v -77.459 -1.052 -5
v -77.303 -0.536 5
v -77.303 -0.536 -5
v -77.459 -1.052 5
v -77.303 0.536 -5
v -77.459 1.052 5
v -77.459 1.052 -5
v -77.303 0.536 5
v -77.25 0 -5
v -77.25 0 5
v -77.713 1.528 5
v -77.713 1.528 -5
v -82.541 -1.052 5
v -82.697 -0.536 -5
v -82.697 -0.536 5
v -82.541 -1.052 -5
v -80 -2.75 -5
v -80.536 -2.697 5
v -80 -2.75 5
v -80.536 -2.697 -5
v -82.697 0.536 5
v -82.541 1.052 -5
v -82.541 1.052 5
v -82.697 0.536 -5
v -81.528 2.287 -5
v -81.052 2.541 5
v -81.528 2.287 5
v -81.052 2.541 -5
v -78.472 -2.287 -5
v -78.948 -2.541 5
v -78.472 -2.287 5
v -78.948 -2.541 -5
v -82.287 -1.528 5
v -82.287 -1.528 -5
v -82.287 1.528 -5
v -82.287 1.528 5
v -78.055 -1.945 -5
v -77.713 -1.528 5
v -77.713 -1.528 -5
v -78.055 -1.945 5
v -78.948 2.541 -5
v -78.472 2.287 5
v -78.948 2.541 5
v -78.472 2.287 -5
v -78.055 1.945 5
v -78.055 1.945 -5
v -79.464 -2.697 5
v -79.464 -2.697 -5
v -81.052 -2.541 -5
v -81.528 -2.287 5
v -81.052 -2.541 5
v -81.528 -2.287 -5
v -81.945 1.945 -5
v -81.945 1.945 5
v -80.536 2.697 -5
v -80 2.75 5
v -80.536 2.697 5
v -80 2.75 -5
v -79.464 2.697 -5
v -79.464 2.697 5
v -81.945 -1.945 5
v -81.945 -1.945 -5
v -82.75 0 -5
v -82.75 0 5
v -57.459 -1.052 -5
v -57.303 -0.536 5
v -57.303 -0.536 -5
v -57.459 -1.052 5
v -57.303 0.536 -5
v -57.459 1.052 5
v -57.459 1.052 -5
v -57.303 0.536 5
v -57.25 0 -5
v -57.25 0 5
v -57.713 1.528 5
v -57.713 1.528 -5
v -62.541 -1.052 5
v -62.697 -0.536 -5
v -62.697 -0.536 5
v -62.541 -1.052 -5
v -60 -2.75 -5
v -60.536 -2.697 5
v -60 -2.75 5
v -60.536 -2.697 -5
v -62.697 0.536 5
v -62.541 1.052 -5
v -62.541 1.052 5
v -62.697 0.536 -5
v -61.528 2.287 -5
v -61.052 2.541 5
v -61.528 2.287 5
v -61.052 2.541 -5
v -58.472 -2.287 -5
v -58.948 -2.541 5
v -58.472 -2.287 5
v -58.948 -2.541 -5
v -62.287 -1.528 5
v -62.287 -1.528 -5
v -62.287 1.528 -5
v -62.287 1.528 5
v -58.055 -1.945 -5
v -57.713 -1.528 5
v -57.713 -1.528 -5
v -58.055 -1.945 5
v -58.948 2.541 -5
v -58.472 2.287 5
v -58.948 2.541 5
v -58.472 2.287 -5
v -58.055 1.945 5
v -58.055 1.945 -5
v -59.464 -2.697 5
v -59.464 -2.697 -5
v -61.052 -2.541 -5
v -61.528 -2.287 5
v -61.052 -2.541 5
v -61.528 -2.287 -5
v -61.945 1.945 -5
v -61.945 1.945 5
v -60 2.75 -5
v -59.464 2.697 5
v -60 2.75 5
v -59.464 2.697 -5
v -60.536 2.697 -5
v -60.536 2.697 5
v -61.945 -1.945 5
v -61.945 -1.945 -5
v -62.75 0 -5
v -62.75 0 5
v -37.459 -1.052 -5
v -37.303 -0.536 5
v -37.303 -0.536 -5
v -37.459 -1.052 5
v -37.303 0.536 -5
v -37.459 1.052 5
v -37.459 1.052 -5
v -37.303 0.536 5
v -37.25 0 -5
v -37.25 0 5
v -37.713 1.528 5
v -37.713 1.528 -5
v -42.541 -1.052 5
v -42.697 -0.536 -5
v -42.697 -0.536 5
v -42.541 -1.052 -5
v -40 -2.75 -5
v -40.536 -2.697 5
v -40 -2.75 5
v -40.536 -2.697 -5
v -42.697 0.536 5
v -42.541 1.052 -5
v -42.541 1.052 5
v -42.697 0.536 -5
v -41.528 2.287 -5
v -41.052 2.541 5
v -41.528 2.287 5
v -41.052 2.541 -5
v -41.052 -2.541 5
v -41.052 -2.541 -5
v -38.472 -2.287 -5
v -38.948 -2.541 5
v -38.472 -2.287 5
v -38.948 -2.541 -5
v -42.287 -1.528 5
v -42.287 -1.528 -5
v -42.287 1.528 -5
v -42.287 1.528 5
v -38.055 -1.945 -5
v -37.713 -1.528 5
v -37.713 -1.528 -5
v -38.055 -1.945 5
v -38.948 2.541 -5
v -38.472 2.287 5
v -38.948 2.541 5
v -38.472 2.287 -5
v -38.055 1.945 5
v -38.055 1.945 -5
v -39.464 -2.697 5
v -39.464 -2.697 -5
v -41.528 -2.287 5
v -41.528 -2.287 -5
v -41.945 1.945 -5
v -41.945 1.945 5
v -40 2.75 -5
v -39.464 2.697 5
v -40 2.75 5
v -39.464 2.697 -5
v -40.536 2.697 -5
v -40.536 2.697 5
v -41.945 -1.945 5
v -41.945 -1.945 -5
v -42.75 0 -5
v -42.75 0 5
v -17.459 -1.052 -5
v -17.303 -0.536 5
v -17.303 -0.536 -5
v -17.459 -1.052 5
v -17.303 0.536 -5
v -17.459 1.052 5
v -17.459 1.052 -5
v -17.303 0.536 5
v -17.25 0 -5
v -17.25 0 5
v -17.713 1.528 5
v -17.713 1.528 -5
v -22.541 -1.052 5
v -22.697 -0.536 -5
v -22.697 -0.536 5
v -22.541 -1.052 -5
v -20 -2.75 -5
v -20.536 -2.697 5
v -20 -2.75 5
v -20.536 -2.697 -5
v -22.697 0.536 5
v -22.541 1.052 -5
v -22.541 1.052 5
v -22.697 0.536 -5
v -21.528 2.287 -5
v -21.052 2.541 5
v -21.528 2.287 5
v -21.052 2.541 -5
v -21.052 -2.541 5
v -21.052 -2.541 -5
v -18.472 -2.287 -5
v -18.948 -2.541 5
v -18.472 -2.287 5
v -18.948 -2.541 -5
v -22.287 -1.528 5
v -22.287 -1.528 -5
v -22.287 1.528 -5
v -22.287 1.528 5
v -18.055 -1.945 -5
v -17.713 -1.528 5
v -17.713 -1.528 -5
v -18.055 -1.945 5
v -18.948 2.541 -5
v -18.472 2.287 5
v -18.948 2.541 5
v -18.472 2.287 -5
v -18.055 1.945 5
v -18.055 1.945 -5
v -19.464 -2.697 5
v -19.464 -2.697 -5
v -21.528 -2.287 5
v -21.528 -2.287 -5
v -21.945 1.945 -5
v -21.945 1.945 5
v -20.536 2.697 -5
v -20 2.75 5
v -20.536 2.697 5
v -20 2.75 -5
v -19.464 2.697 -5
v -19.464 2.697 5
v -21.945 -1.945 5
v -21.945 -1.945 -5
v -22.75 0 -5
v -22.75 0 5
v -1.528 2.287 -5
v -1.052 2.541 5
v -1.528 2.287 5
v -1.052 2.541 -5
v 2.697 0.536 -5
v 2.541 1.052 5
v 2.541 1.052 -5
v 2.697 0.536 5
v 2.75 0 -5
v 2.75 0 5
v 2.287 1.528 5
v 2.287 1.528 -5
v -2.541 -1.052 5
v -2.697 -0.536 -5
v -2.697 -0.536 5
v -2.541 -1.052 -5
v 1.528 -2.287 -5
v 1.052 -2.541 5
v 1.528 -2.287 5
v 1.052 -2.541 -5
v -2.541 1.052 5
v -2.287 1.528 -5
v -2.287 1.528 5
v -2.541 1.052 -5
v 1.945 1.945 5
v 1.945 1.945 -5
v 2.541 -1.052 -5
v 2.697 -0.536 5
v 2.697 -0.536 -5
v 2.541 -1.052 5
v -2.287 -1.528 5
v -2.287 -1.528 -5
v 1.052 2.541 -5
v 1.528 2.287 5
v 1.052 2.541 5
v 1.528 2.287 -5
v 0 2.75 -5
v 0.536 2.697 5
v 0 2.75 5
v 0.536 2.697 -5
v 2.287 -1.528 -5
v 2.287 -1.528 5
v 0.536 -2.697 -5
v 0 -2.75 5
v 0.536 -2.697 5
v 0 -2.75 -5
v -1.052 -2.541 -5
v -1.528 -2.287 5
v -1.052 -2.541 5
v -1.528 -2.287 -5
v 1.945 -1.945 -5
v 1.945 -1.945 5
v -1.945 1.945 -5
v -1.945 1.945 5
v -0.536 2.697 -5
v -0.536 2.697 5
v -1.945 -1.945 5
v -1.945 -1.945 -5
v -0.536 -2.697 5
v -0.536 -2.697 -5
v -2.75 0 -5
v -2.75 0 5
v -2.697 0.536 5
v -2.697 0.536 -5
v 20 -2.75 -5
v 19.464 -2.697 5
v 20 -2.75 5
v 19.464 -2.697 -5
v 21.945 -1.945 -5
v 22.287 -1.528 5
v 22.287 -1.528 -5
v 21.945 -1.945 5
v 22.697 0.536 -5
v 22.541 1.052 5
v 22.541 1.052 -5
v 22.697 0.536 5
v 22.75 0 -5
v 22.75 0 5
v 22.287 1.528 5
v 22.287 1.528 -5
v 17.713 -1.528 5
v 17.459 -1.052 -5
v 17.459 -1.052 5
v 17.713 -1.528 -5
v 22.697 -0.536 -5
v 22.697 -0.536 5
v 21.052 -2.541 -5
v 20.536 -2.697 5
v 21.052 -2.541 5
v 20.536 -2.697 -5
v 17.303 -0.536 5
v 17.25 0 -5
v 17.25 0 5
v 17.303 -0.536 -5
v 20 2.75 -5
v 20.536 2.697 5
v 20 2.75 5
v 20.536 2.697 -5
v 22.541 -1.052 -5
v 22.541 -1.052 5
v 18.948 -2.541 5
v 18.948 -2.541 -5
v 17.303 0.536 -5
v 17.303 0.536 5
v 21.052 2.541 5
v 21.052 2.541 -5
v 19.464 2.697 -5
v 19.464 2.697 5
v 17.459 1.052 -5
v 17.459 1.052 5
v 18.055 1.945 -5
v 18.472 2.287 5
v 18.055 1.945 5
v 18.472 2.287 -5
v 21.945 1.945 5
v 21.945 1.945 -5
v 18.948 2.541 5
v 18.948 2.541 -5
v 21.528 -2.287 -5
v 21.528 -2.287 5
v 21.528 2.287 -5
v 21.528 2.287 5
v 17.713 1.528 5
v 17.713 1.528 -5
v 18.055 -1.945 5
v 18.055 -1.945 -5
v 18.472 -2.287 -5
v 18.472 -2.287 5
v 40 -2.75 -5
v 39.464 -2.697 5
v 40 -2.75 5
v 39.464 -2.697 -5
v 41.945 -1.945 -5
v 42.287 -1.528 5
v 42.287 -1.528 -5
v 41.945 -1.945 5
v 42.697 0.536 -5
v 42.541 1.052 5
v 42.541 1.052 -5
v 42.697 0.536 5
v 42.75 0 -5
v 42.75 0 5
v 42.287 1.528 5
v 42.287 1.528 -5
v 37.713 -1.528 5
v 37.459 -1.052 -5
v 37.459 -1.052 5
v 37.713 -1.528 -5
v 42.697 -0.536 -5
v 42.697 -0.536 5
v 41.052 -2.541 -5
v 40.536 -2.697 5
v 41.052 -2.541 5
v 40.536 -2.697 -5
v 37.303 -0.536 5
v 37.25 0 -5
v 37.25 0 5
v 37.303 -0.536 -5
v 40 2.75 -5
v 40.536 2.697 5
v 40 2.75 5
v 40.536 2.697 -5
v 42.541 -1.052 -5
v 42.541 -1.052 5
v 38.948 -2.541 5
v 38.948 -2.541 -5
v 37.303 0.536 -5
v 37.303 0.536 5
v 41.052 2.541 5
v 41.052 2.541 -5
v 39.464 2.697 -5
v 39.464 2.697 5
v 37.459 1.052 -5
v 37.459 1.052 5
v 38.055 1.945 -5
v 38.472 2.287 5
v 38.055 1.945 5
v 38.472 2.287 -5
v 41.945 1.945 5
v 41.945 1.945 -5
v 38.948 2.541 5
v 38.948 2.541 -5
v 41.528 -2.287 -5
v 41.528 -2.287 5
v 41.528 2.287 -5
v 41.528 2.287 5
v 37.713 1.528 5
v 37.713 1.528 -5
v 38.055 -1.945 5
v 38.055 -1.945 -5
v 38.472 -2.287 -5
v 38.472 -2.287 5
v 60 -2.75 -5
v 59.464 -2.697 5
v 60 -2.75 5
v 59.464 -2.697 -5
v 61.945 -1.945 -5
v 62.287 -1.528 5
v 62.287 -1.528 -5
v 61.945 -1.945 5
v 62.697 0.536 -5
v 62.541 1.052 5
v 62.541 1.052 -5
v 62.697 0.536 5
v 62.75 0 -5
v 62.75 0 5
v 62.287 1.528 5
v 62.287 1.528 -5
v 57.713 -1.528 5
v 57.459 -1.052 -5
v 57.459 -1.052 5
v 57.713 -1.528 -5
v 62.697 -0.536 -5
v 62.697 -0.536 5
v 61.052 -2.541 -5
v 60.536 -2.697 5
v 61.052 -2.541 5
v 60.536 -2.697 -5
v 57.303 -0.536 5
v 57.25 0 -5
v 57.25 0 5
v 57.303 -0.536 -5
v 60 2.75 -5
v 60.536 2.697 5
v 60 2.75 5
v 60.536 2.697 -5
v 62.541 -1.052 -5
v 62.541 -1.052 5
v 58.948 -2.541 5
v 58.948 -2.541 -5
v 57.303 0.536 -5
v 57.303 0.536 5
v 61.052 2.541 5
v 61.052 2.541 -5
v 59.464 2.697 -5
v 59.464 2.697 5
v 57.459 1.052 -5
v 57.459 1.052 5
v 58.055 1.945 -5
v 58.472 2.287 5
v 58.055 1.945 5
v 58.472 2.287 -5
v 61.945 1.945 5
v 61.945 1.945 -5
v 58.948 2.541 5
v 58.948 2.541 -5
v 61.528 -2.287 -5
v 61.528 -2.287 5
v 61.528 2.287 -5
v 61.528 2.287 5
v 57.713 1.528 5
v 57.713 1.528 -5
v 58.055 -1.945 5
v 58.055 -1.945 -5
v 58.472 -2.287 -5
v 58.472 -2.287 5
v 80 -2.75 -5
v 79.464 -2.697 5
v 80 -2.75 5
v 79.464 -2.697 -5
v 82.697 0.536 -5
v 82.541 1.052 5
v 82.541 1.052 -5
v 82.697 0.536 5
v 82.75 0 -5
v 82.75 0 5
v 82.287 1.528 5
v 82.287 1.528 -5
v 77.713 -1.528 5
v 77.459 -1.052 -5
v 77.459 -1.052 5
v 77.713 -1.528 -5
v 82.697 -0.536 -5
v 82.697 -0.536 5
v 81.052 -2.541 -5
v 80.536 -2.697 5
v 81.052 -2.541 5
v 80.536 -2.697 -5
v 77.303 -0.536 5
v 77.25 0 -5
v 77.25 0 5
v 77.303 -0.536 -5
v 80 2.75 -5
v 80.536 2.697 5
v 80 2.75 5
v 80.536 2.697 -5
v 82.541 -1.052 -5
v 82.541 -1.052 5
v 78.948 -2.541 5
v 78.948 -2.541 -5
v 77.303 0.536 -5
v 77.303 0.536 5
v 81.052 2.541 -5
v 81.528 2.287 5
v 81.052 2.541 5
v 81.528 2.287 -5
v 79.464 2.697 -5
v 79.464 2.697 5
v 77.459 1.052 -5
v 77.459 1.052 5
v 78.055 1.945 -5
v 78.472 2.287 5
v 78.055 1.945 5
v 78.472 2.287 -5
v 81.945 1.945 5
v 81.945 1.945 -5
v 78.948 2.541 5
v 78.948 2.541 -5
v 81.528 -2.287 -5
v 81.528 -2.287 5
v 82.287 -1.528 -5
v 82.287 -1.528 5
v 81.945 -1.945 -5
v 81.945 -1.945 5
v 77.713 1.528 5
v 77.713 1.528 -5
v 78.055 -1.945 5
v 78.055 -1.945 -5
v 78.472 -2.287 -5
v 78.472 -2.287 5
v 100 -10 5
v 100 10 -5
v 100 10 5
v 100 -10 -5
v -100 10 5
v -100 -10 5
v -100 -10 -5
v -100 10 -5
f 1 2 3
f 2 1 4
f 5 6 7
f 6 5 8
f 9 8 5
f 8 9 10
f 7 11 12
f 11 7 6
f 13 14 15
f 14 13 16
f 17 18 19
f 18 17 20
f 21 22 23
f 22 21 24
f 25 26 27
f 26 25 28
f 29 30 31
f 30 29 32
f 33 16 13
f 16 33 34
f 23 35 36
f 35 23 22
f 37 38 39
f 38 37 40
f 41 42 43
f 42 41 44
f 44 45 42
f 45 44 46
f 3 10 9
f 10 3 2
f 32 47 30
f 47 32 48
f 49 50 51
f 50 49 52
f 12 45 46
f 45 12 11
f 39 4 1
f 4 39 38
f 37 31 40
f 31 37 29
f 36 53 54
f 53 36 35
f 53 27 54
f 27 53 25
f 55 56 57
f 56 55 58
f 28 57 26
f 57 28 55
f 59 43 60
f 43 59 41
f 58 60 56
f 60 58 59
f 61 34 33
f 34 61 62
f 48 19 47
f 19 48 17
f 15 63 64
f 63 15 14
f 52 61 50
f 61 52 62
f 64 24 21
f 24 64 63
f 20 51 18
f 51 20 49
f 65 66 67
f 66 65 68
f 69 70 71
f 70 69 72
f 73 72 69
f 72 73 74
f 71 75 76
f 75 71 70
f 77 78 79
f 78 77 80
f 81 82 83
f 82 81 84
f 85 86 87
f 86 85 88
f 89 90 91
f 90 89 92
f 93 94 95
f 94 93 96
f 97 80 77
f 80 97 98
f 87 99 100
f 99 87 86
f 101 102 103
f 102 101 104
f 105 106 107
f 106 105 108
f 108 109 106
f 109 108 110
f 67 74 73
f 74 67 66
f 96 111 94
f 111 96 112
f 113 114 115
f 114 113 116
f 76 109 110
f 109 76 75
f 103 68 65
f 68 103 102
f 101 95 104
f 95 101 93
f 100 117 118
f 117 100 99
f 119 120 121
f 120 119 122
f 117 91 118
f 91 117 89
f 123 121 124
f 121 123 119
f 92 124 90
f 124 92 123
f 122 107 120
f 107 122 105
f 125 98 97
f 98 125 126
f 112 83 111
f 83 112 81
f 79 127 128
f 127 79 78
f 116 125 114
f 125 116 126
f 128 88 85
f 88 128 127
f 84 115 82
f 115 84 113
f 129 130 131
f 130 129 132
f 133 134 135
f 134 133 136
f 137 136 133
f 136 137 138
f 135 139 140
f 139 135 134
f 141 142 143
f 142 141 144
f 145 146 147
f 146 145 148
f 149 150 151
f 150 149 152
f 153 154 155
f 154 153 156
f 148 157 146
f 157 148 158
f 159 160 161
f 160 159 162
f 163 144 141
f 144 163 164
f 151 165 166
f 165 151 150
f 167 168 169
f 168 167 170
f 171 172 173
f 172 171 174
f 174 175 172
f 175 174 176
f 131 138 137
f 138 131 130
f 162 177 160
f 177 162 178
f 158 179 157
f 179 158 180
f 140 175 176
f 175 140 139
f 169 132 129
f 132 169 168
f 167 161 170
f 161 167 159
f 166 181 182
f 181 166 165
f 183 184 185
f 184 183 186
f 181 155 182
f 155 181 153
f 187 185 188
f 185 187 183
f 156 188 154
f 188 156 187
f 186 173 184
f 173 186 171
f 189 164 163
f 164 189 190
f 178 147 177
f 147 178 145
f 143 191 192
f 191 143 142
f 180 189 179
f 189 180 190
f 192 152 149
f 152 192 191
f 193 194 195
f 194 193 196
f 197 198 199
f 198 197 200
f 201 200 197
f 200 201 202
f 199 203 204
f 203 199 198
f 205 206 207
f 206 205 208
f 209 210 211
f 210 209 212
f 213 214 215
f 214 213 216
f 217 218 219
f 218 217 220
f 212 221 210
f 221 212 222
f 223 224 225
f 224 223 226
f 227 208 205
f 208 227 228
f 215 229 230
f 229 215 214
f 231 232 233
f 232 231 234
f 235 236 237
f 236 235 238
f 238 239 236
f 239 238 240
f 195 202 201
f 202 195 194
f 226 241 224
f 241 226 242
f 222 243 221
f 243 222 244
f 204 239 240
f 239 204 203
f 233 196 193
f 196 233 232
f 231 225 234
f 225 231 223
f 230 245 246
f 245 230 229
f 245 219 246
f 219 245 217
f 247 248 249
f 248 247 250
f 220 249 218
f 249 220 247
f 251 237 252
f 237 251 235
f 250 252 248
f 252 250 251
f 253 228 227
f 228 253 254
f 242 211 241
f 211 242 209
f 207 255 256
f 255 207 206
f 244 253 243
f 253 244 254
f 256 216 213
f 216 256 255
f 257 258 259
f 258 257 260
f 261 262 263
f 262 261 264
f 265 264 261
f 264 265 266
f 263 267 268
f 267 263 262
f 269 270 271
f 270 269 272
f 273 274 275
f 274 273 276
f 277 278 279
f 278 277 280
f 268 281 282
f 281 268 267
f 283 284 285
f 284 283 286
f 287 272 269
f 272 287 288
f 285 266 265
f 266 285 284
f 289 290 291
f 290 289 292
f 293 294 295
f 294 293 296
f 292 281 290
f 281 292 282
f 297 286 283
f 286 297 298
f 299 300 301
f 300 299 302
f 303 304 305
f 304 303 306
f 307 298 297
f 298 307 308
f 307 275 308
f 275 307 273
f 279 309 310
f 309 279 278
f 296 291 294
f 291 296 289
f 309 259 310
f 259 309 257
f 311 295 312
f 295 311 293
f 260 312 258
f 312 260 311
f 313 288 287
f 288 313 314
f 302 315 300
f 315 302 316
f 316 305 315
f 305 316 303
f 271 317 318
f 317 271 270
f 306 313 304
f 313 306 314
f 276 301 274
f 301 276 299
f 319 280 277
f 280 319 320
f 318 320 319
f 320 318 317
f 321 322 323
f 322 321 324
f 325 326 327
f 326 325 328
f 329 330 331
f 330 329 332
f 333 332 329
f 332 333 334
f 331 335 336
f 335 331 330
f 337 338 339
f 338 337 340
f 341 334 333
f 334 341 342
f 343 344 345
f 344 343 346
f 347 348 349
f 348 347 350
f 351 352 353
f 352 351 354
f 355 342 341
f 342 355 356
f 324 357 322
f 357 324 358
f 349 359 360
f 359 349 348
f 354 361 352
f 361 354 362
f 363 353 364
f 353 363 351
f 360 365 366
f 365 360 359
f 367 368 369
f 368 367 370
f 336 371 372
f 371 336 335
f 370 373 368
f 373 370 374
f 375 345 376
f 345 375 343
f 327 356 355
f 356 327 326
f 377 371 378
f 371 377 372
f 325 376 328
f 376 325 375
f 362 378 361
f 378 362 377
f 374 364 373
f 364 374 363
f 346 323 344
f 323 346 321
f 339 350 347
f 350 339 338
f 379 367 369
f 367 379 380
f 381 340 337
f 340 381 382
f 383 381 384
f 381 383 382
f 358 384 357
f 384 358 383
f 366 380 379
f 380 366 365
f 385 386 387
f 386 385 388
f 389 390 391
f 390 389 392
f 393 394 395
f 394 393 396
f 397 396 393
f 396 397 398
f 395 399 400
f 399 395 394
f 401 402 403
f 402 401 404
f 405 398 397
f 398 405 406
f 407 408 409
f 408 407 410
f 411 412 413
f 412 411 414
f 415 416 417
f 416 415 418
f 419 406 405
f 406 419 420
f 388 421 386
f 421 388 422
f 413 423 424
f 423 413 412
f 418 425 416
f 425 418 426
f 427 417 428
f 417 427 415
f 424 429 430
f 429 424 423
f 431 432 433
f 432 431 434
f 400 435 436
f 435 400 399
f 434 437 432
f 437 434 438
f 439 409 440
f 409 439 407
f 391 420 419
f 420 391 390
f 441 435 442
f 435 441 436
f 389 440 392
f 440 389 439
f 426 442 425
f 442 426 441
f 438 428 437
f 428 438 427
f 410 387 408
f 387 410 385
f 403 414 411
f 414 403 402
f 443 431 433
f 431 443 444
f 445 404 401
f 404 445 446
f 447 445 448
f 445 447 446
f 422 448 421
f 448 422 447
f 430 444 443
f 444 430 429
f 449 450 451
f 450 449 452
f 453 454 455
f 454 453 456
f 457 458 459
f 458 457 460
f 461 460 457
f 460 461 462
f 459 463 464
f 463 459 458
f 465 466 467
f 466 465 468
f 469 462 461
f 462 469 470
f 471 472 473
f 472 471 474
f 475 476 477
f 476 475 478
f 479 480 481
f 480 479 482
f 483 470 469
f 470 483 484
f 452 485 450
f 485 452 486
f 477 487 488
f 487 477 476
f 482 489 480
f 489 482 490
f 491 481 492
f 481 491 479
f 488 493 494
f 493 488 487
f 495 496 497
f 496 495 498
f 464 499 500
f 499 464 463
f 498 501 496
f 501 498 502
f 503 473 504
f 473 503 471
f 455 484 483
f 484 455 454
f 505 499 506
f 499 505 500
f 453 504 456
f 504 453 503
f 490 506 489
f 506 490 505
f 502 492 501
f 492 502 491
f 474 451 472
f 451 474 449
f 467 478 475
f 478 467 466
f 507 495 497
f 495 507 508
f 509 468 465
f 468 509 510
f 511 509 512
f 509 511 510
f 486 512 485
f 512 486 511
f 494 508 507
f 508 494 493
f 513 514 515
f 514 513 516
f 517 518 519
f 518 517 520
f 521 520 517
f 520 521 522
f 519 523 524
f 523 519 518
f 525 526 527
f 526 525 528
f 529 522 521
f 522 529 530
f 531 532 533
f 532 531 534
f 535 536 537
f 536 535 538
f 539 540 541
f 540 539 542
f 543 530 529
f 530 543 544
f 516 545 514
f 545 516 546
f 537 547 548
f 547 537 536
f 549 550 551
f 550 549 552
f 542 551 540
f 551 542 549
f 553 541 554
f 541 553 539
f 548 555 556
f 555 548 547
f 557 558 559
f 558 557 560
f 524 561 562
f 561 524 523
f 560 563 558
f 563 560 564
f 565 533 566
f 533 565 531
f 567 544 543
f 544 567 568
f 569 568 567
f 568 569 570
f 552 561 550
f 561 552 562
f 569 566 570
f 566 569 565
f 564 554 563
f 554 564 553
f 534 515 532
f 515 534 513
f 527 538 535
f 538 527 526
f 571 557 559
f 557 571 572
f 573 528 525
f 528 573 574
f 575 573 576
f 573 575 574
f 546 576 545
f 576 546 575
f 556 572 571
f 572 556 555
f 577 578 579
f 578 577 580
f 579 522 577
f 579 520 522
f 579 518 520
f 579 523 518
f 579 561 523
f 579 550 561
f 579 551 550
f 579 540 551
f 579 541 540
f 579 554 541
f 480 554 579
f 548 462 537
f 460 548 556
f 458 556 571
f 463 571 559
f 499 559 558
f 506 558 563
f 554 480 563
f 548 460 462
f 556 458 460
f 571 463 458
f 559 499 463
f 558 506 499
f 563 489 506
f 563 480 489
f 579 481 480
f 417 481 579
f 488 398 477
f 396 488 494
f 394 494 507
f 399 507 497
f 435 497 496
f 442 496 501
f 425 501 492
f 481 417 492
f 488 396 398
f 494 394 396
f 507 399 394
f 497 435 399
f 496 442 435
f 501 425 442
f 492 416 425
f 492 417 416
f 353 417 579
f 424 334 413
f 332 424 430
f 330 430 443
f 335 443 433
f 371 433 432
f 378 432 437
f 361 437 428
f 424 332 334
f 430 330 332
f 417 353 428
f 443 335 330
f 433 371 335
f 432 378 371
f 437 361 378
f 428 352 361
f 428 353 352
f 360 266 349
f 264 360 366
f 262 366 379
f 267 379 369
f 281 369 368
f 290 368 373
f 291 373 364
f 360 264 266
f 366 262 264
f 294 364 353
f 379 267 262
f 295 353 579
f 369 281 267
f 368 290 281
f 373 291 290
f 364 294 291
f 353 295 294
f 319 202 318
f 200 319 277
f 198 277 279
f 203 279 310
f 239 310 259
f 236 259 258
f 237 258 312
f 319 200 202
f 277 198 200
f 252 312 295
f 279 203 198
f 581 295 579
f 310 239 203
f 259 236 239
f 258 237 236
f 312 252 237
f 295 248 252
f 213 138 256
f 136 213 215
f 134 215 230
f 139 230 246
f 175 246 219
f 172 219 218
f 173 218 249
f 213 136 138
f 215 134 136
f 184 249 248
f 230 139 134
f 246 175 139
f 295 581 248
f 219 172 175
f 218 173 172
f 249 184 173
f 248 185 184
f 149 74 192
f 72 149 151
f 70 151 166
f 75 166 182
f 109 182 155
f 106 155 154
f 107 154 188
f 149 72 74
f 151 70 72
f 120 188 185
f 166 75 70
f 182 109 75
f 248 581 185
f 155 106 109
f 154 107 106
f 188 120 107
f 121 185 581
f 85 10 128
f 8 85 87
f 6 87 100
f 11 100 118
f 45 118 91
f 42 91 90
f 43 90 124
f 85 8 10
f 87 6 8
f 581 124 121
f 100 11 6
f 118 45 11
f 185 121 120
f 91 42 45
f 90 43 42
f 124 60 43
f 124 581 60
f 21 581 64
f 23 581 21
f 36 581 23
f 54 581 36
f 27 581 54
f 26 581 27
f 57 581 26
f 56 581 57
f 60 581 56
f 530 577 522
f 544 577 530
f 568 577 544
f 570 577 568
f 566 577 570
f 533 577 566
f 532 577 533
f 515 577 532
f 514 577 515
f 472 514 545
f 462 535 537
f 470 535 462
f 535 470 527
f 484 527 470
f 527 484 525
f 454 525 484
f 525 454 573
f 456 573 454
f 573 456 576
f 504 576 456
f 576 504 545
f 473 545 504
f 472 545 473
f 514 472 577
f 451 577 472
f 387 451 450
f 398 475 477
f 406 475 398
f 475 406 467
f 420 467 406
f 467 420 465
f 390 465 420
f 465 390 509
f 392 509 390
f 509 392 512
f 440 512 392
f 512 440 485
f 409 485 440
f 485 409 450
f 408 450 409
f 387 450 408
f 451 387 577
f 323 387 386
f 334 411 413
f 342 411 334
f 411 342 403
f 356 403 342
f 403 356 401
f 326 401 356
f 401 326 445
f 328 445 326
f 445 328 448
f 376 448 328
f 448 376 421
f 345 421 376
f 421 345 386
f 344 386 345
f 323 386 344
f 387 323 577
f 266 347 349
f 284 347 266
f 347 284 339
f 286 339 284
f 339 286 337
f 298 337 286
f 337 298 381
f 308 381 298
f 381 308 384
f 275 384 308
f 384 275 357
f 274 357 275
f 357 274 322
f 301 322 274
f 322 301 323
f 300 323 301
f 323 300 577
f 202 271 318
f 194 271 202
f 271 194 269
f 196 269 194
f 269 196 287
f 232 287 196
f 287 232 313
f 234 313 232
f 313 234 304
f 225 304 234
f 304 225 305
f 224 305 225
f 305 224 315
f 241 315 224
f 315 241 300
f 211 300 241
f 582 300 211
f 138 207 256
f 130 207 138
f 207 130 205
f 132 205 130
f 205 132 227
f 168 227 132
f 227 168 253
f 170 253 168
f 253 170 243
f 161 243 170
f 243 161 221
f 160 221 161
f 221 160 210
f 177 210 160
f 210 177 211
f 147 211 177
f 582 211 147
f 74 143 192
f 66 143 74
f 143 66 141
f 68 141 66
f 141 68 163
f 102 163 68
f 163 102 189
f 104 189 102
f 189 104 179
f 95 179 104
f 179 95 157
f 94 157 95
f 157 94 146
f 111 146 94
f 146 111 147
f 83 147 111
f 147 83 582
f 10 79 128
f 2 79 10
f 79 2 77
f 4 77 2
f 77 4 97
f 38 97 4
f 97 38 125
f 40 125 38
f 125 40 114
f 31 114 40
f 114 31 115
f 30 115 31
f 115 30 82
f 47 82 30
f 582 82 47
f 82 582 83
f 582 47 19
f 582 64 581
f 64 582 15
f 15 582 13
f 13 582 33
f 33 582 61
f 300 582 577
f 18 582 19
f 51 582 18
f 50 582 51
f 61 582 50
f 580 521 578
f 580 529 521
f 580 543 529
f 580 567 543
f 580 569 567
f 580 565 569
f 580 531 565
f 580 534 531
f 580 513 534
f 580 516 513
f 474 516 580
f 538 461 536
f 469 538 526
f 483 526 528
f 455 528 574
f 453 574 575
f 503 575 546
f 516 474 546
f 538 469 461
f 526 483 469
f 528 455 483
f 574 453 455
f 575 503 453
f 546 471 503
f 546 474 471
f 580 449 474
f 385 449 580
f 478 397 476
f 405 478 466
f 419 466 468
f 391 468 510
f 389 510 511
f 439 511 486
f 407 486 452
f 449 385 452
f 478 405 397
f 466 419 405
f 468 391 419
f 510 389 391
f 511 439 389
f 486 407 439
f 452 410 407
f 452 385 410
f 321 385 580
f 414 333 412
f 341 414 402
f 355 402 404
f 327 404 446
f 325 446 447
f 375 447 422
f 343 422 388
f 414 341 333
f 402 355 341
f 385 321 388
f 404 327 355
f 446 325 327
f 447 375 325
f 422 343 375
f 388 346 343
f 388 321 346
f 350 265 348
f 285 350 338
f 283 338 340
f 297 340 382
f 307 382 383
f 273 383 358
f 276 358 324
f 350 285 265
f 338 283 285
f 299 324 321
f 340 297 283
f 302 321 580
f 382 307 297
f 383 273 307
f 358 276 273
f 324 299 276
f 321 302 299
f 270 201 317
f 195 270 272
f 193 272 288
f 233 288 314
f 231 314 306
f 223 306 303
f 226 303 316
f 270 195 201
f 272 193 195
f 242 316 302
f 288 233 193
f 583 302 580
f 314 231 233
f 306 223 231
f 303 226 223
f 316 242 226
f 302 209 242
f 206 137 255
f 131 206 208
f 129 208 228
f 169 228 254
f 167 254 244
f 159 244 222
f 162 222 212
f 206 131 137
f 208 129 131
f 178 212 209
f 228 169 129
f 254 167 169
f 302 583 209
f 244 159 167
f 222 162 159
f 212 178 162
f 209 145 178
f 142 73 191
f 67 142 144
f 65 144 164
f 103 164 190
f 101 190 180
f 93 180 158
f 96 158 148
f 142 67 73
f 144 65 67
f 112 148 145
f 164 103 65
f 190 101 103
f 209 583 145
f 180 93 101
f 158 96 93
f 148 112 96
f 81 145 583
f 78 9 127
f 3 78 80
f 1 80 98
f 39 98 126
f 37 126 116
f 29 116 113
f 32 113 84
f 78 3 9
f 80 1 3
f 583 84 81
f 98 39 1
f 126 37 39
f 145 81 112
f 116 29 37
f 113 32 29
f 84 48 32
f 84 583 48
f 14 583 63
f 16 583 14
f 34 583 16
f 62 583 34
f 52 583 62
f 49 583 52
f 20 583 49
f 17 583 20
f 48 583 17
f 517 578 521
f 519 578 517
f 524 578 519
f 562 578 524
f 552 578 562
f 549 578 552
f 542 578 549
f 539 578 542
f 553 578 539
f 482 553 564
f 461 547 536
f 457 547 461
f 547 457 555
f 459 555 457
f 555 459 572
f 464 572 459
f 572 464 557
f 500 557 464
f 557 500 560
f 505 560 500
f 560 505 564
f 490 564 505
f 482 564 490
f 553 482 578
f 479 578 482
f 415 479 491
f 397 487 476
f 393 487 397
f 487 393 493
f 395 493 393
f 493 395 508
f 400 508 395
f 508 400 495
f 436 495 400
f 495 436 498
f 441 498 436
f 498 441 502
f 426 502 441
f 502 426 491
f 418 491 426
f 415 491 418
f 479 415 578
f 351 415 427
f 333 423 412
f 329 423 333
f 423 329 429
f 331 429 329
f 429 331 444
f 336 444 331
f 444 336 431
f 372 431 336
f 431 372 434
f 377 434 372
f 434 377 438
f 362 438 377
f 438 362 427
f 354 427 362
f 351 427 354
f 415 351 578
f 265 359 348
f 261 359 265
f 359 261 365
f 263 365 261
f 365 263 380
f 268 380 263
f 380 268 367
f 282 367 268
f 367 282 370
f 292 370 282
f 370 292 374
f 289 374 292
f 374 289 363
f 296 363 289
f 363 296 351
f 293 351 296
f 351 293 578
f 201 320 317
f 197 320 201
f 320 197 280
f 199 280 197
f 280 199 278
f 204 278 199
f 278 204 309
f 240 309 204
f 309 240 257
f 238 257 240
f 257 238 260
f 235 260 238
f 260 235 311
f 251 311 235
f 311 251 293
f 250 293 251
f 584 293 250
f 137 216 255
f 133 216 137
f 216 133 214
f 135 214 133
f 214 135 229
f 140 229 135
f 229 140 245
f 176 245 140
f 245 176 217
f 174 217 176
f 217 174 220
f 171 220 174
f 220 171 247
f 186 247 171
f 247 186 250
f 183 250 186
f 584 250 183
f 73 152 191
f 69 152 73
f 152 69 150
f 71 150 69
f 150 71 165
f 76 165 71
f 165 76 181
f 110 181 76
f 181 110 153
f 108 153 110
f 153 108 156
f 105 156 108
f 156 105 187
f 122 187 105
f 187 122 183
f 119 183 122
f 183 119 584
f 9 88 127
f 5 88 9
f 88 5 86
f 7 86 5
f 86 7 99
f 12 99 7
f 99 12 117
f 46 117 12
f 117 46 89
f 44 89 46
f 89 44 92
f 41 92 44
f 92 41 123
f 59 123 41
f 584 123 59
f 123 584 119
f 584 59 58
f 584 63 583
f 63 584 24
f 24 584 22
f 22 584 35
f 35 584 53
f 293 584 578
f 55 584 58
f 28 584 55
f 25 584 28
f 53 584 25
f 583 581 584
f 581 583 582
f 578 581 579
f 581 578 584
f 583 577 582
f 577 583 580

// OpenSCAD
$fn = 32;

// ----------------------------------------------------------------------
// Hole bar, 9 x Ø5.5
// skip layout, 20 mm edge offset
// ----------------------------------------------------------------------

// --- parameters (mm) ---
bar_w = 20;       // bar width (Y)
bar_t = 10;       // bar thickness (Z)
holes = 9;        // holes per row
hole_d = 5.5;     // hole diameter
edge = 20;        // offset from the bar end to the first hole
grid_pitch = 10;  // grid the bar was laid out on

// --- derived feature positions (mm) ---
pitch = grid_pitch * 2;       // = 20   holes sit every other grid slot
span = (holes - 1) * pitch;   // = 160   distance between the end holes
bar_l = span + 2 * edge;      // = 200   overall bar length
start_x = -bar_l / 2 + edge;  // = -80   X of the first hole
feature_centers = [
  [start_x + 0 * pitch, 0],
  [start_x + 1 * pitch, 0],
  [start_x + 2 * pitch, 0],
  [start_x + 3 * pitch, 0],
  [start_x + 4 * pitch, 0],
  [start_x + 5 * pitch, 0],
  [start_x + 6 * pitch, 0],
  [start_x + 7 * pitch, 0],
  [start_x + 8 * pitch, 0]
];   // hole centres of the first row

// bar with one row of holes, drilled from feature_centers
difference() {
  translate([-bar_l / 2, -bar_w / 2, -bar_t / 2]) cube([bar_l, bar_w, bar_t]);
  for (centre = feature_centers)
    translate([centre[0], centre[1], 0])
      cylinder(d = hole_d, h = bar_t + 2, center = true);
}
